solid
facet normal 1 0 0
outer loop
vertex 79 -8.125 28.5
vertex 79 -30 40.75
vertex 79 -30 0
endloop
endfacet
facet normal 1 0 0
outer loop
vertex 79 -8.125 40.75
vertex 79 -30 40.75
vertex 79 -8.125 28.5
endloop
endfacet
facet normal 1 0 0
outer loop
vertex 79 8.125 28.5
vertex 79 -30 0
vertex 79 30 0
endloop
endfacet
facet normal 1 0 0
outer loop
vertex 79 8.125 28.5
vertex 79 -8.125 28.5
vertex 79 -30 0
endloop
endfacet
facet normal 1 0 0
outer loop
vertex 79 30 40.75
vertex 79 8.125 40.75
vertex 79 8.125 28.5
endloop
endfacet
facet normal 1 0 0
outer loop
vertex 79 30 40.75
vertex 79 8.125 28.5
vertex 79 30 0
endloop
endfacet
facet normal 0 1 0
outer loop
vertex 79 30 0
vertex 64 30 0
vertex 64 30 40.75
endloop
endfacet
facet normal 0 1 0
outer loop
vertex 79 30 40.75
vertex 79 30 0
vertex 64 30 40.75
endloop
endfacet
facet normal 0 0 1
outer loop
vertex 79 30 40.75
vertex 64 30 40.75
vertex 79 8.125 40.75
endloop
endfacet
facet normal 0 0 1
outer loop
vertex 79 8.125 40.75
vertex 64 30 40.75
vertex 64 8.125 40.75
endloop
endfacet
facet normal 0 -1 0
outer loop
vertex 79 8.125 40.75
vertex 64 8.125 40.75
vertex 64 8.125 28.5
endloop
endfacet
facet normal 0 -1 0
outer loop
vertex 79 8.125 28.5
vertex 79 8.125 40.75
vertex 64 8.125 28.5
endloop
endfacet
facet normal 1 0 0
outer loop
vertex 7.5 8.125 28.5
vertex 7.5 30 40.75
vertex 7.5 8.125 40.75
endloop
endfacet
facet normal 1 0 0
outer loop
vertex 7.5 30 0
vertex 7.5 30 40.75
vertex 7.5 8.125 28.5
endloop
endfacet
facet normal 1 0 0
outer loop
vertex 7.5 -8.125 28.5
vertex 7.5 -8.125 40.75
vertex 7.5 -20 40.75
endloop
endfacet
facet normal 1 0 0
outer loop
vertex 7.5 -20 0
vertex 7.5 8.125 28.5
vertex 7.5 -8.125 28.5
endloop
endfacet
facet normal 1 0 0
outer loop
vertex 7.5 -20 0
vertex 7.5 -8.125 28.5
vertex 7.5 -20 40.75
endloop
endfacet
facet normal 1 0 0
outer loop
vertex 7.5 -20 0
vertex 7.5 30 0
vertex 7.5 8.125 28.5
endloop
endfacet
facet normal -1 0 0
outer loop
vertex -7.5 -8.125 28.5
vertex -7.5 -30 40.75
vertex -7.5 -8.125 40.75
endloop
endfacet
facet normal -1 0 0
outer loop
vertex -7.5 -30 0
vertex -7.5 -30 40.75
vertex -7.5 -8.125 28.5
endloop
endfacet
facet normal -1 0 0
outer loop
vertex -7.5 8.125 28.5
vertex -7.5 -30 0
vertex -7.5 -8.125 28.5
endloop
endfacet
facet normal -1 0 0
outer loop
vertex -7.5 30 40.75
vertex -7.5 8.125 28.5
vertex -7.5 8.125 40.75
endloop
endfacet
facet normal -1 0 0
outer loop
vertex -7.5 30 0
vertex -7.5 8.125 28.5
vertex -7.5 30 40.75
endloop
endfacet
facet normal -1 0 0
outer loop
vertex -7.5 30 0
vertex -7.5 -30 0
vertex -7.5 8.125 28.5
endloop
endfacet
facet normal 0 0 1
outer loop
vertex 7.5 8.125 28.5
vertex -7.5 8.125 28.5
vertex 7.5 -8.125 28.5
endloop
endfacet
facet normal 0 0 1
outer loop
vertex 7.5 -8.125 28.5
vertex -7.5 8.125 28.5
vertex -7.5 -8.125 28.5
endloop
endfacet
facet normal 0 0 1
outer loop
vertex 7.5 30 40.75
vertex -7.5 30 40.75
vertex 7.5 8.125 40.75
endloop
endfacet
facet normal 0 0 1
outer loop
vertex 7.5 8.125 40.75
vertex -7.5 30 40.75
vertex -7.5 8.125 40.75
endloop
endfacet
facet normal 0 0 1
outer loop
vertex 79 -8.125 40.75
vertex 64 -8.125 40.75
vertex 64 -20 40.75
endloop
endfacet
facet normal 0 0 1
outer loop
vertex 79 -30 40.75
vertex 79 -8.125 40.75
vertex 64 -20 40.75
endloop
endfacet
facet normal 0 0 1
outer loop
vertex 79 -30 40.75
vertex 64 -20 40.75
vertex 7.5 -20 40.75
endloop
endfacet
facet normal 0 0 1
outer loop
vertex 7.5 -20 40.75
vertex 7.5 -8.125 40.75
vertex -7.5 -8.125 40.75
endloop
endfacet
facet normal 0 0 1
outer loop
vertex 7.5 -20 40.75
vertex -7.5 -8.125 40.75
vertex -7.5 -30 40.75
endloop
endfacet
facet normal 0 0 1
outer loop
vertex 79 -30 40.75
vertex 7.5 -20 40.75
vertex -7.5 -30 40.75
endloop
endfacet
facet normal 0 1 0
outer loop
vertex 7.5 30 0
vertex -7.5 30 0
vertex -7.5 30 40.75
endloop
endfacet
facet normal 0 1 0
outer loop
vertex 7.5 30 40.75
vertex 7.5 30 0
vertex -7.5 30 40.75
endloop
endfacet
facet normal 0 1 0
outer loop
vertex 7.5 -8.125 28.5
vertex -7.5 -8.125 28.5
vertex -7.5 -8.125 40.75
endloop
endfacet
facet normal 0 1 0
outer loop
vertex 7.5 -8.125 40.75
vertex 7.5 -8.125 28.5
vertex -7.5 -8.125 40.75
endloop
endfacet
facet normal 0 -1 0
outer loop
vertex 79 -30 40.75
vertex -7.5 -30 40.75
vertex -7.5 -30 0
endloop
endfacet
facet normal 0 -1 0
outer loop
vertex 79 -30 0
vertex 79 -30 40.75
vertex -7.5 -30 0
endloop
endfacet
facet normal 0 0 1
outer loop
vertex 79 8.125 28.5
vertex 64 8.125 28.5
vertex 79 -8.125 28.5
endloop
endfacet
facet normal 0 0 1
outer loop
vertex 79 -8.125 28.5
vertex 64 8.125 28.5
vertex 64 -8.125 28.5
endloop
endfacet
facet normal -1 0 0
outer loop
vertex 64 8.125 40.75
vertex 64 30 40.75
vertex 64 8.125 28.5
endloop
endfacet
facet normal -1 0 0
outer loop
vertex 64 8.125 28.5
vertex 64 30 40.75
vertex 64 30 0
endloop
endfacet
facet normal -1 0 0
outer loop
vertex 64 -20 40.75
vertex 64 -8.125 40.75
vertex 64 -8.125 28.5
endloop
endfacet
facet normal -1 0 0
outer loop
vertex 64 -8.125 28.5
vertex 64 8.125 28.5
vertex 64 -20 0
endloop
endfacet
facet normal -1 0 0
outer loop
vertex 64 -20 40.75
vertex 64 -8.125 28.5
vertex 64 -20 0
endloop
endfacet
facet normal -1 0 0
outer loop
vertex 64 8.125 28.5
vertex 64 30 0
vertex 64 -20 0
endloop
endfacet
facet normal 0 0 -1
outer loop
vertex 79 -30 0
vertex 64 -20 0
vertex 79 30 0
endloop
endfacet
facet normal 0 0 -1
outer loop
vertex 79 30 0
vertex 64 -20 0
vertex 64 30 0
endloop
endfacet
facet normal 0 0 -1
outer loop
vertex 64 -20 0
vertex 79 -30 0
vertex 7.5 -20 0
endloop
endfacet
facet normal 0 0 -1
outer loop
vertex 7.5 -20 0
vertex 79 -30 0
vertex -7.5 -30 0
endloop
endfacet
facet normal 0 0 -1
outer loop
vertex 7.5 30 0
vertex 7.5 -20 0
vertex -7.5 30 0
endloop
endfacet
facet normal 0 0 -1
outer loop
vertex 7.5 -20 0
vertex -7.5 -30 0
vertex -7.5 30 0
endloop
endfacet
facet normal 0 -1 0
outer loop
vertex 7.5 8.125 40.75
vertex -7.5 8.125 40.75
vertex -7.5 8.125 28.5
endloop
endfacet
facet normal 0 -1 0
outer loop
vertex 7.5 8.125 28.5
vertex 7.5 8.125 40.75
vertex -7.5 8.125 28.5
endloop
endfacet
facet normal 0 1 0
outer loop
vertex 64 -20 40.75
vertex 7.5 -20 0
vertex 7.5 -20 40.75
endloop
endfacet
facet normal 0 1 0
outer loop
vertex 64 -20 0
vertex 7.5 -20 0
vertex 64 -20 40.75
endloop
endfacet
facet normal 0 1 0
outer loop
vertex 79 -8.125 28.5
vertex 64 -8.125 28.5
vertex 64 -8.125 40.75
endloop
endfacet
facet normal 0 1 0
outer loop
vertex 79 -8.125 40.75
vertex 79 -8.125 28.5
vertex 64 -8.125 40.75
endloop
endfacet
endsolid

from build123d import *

# Parameters (mm, degrees)
F0_W     = 15
F0_H     = 60
F1_DEPTH = 28.5
F3_W     = 56.5
F3_H     = 50
F4_DEPTH = 28.501
F2_W     = 15
F2_H     = 21.875
F5_DEPTH = 12.25
F6_DEPTH = 71.5
F7_DEPTH = 40.751


with BuildPart() as f1:
    # F0 (on Top) → F1 (new body)
    with BuildSketch(Plane.XY):
        Rectangle(F0_W, F0_H)
    extrude(amount=F1_DEPTH)

    # F3 (on face) → F4 (cut, through all)
    with BuildSketch(Plane(origin=(0, 0, 0), x_dir=(1, 0, 0), z_dir=(0, 0, -1))):
        with Locations((35.75, -5)):
            Rectangle(F3_W, F3_H)
    extrude(amount=-F4_DEPTH, mode=Mode.SUBTRACT)

    # F2 (on face) → F5 (join)
    with BuildSketch(Plane.XY.offset(28.5)):
        with Locations((0, 19.0625)):
            Rectangle(F2_W, F2_H)
        with Locations((0, -19.0625)):
            Rectangle(F2_W, F2_H)
    extrude(amount=F5_DEPTH)

    # F5_face (on face) → F6 (join)
    with BuildSketch(Plane(origin=(7.5, 0, 19.11199), x_dir=(0, 1, 0), z_dir=(1, 0, 0))):
        Polygon((-30, -19.11199), (30, -19.11199), (30, 21.63801), (8.125, 21.63801), (8.125, 9.38801), (-8.125, 9.38801), (-8.125, 21.63801), (-30, 21.63801), align=None)
    extrude(amount=F6_DEPTH)

    # F3 (on face) → F7 (cut, through all)
    with BuildSketch(Plane(origin=(0, 0, 0), x_dir=(1, 0, 0), z_dir=(0, 0, -1))):
        with Locations((35.75, -5)):
            Rectangle(F3_W, F3_H)
    extrude(amount=-F7_DEPTH, mode=Mode.SUBTRACT)


solid = f1.part
